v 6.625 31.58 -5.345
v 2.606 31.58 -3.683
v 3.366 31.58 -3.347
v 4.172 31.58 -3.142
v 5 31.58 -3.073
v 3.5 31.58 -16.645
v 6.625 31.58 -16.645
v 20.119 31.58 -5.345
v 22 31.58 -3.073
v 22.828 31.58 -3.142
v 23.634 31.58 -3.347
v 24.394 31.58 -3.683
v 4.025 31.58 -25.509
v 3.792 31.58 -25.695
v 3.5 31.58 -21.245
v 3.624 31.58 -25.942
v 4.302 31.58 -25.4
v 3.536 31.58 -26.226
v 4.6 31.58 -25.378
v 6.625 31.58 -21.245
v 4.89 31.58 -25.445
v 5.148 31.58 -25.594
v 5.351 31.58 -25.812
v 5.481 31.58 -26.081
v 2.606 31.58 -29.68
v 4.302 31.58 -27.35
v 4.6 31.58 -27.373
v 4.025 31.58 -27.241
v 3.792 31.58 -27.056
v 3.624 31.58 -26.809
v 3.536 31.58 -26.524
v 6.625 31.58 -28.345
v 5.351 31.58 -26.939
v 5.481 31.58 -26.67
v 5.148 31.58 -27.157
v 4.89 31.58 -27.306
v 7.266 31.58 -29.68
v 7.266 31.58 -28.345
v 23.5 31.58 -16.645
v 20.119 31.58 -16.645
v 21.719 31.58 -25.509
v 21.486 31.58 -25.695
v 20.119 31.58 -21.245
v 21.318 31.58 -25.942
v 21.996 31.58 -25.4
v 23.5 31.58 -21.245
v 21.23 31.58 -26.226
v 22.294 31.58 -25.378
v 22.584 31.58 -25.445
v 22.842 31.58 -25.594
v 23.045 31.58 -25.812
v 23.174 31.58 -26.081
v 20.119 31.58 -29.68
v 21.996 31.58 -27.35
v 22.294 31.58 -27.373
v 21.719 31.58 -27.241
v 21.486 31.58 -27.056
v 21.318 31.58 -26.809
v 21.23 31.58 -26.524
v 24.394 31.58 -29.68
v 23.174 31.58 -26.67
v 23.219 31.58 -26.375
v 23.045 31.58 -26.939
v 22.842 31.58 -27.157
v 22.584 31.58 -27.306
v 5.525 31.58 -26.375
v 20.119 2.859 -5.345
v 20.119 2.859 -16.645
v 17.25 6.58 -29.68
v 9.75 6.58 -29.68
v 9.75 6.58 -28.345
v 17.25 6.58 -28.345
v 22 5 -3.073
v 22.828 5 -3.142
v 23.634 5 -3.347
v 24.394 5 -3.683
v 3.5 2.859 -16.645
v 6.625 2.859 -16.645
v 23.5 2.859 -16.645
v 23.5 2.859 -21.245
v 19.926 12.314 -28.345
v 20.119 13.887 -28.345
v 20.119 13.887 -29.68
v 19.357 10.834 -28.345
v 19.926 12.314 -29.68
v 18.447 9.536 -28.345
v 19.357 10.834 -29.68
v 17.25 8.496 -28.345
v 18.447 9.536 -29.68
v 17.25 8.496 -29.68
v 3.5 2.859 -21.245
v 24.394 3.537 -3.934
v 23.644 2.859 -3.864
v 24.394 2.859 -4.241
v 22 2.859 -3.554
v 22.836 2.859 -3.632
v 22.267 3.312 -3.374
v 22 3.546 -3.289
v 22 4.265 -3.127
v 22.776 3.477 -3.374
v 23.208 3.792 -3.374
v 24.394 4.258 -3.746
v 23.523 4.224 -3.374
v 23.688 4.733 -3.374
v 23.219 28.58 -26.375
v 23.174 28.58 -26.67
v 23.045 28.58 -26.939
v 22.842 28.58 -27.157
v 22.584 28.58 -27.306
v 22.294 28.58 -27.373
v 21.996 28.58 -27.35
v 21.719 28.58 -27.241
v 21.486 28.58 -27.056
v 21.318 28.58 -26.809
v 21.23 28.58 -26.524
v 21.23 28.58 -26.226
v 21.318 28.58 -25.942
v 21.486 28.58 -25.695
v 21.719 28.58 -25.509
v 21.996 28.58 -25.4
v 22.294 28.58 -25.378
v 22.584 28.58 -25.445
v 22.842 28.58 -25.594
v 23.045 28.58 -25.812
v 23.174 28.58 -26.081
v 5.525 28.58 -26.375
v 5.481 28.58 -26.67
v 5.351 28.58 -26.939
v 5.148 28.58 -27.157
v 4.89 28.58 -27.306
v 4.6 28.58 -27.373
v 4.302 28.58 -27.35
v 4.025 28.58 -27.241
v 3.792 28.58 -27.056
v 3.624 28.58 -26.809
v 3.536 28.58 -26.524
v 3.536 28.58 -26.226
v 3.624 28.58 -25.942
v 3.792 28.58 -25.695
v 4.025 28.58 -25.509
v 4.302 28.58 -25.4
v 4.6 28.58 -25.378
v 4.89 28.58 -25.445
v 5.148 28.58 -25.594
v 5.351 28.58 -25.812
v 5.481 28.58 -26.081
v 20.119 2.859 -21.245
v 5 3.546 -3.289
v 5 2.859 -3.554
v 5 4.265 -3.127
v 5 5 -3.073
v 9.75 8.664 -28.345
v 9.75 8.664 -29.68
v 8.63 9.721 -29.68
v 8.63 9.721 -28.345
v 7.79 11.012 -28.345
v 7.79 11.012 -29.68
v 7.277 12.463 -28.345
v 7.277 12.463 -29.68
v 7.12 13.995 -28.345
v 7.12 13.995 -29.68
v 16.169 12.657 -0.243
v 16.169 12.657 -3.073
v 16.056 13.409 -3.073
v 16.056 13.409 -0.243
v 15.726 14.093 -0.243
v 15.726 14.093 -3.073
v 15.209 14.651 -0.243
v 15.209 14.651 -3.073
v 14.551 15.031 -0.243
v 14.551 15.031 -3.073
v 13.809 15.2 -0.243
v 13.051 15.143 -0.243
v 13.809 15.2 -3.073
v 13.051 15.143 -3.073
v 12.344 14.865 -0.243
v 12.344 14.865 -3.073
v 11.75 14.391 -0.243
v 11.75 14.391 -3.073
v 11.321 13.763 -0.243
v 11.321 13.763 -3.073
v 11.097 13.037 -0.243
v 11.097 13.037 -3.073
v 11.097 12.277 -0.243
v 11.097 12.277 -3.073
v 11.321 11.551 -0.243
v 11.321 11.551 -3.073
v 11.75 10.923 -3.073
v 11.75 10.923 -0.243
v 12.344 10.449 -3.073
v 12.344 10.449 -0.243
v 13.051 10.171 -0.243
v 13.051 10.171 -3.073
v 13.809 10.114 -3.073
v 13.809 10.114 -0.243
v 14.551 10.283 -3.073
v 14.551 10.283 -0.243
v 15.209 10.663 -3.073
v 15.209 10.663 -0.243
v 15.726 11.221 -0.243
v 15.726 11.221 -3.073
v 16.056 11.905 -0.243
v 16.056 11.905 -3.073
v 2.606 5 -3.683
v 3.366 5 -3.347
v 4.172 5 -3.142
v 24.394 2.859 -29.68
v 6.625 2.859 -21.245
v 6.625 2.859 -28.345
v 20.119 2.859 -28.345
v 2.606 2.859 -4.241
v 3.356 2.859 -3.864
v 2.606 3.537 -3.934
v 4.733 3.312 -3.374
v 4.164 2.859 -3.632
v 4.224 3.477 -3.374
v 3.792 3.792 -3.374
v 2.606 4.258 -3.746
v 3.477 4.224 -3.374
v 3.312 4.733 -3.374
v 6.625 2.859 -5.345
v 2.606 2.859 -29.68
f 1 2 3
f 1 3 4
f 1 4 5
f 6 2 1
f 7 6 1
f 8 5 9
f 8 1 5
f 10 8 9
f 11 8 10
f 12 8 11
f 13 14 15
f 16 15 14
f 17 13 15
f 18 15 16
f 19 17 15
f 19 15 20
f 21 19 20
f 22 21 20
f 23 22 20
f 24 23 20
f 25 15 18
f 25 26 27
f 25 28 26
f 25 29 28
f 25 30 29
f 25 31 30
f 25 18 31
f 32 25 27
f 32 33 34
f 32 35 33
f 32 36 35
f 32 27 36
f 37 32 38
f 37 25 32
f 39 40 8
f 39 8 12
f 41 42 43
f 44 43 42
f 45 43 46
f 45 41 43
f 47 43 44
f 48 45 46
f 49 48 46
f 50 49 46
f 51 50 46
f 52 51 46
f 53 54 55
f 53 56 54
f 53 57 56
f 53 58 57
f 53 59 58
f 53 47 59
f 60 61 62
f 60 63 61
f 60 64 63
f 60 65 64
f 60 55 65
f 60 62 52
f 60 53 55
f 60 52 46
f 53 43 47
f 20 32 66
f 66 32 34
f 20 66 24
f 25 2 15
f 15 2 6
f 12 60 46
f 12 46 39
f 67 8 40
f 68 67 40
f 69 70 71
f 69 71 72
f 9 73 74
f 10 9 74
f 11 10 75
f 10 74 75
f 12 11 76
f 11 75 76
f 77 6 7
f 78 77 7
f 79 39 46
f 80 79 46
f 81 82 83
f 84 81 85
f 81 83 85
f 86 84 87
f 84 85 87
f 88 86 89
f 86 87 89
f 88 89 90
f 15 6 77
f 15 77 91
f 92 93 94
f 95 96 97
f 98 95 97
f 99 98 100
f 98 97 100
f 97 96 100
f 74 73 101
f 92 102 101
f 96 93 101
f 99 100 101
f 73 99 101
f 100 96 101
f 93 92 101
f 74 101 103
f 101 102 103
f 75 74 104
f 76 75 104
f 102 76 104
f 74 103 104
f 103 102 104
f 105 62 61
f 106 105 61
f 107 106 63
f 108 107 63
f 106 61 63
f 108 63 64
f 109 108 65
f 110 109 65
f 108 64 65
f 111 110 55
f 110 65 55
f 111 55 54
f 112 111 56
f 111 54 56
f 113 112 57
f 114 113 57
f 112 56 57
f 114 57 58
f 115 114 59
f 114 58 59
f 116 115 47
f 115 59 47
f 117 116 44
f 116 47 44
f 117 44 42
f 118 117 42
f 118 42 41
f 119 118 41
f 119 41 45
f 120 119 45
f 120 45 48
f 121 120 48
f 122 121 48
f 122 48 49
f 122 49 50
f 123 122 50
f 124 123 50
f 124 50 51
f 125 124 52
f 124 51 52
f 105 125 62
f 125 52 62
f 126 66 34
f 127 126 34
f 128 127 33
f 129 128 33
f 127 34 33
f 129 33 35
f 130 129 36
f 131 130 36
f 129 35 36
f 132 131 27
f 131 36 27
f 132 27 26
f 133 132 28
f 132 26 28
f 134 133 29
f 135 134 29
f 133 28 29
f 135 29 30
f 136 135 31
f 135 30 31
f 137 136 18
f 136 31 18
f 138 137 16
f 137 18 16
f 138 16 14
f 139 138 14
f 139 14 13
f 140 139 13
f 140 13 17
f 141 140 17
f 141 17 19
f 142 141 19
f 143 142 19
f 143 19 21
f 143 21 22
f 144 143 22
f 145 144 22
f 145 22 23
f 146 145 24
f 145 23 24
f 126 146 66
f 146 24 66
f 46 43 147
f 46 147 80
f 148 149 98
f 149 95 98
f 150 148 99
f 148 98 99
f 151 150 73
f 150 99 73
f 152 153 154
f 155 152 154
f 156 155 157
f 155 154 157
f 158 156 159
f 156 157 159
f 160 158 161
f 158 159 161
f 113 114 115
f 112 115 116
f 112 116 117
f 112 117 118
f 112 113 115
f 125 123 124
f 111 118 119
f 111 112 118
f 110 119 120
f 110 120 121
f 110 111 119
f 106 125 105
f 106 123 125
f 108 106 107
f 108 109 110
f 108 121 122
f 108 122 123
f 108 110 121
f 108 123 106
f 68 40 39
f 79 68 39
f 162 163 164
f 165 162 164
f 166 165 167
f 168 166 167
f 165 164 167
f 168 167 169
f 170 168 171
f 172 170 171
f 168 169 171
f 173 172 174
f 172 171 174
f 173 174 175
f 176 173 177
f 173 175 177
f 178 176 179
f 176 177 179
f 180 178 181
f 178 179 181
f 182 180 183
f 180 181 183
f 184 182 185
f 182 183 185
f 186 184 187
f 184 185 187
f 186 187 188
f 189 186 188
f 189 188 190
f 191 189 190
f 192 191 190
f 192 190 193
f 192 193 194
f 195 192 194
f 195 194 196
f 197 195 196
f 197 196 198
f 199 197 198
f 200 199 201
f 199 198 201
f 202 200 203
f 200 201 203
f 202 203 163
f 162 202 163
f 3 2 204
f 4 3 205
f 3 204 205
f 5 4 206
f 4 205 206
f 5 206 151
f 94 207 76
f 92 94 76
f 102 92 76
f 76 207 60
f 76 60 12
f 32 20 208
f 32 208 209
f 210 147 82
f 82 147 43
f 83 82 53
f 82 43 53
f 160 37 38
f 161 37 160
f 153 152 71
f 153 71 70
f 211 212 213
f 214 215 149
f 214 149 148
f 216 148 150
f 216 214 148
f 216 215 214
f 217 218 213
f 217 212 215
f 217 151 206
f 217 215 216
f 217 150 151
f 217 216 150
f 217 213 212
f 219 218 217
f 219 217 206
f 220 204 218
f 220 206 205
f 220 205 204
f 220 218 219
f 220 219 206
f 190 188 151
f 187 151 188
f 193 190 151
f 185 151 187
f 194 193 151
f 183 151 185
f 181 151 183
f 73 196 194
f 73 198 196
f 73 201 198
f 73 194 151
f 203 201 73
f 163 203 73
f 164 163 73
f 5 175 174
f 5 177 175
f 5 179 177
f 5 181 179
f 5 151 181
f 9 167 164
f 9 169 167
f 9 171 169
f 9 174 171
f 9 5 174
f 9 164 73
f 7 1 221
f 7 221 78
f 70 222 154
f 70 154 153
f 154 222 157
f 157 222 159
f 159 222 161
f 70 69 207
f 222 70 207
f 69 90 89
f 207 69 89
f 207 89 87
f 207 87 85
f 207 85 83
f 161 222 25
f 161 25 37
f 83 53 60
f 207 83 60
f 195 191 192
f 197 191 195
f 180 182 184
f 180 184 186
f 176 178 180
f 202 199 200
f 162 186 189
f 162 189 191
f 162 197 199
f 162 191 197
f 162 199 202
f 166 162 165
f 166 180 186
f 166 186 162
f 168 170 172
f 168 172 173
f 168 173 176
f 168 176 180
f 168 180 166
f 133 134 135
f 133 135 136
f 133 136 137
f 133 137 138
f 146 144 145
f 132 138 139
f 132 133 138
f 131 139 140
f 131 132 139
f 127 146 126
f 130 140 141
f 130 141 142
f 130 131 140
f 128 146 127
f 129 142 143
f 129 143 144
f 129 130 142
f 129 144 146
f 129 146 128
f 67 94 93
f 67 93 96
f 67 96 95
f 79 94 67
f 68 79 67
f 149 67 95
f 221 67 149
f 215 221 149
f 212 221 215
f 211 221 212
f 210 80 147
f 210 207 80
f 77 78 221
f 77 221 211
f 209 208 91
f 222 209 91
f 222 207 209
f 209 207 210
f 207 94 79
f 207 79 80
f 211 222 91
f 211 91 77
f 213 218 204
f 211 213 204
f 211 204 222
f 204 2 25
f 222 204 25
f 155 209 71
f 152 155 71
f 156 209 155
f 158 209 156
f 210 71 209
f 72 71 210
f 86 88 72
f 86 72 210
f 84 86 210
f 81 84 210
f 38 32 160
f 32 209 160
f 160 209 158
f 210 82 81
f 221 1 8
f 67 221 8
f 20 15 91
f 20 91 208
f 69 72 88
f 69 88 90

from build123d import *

# Parameters (mm, degrees)
SKETCH1_W           = 27
SKETCH1_H           = 32
BOSS_EXTRUDE1_DEPTH = 31.58
SKETCH3_W           = 20
SKETCH3_H           = 23
CUT_EXTRUDE1_DEPTH  = 30
SKETCH4_W           = 7.5
SKETCH4_H           = 3.655478676
CUT_EXTRUDE2_DEPTH  = 25
SKETCH5_R           = 6.5
SKETCH5_R_2         = 1.269841787
CUT_EXTRUDE4_DEPTH  = 10
SKETCH6_W           = 27
SKETCH6_H           = 3.072558681
CUT_EXTRUDE5_DEPTH  = 32.58
FILLET2_R           = 5
SKETCH7_R           = 2.55
BOSS_EXTRUDE2_DEPTH = 2.83
SKETCH8_W           = 3.381092642
SKETCH8_H           = 7.1
SKETCH8_H_2         = 11.3
SKETCH8_W_2         = 3.125
BOSS_EXTRUDE4_DEPTH = 30
SKETCH11_W          = 2.605806733
SKETCH11_H          = 28.316955939
CUT_EXTRUDE10_DEPTH = 32.58
SKETCH12_W          = 21.788386534
SKETCH12_H          = 2.319503847
CUT_EXTRUDE11_DEPTH = 32.58
SKETCH13_W          = 21.788386534
SKETCH13_H          = 2.858824784
CUT_EXTRUDE12_DEPTH = 30.437937473
CUT_EXTRUDE13_DEPTH = 10
SKETCH15_R          = 1
CUT_EXTRUDE14_DEPTH = 3


with BuildPart() as part:
    # Sketch1 → Boss-Extrude1 (new body)
    with BuildSketch(Plane(origin=(0, 0, 0), x_dir=(1, 0, 0), z_dir=(0, 1, 0))):
        with Locations((13.5, 16)):
            Rectangle(SKETCH1_W, SKETCH1_H)
    extrude(amount=BOSS_EXTRUDE1_DEPTH)

    # Sketch3 → Cut-Extrude1 (cut)
    with BuildSketch(Plane(origin=(0, 31.58, 0), x_dir=(1, 0, 0), z_dir=(0, 1, 0))):
        with Locations((13.5, 16.844521324)):
            Rectangle(SKETCH3_W, SKETCH3_H)
    extrude(amount=-CUT_EXTRUDE1_DEPTH, mode=Mode.SUBTRACT)

    # Sketch4 → Cut-Extrude2 (cut)
    with BuildSketch(Plane(origin=(0, 31.58, 0), x_dir=(1, 0, 0), z_dir=(0, 1, 0))):
        with Locations((13.5, 30.172260662)):
            Rectangle(SKETCH4_W, SKETCH4_H)
    extrude(amount=-CUT_EXTRUDE2_DEPTH, mode=Mode.SUBTRACT)

    # Sketch5 → Cut-Extrude4 (cut)
    with BuildSketch(Plane(origin=(0, 0, -32), x_dir=(-1, 0, 0), z_dir=(0, 0, -1))):
        with Locations((-13.618907358, 13.887482267)):
            Circle(SKETCH5_R)
        with Locations((-13.618907358, 13.887482267)):
            Circle(SKETCH5_R_2, mode=Mode.SUBTRACT)
    extrude(amount=-CUT_EXTRUDE4_DEPTH, mode=Mode.SUBTRACT)

    # Sketch6 → Cut-Extrude5 (cut, through all)
    with BuildSketch(Plane(origin=(0, 31.58, 0), x_dir=(1, 0, 0), z_dir=(0, 1, 0))):
        with Locations((13.5, 1.536279341)):
            Rectangle(SKETCH6_W, SKETCH6_H)
    extrude(amount=-CUT_EXTRUDE5_DEPTH, mode=Mode.SUBTRACT)

    # Fillet2
    fillet2_edges = [part.edges().sort_by_distance(p)[0] for p in [
        (13.5, 0, -32),
        (0, 0, -17.53627934),
        (27, 0, -17.53627934),
        (13.5, 0, -3.072558681),
        (0, 15.79, -3.072558681),
        (27, 15.79, -3.072558681),
        (0, 15.79, -32),
        (27, 15.79, -32),
    ]]
    fillet(fillet2_edges, radius=FILLET2_R)

    # Sketch7 → Boss-Extrude2 (add)
    with BuildSketch(Plane.XY.offset(-3.072558681)):
        with Locations((13.618907358, 12.657)):
            Circle(SKETCH7_R)
    extrude(amount=BOSS_EXTRUDE2_DEPTH)

    # Sketch8 → Boss-Extrude4 (add)
    with BuildSketch(Plane(origin=(0, 31.58, 0), x_dir=(1, 0, 0), z_dir=(0, 1, 0))):
        with Locations((21.809453679, 24.794521324)):
            Rectangle(SKETCH8_W, SKETCH8_H)
        with Locations((21.809453679, 10.994521324)):
            Rectangle(SKETCH8_W, SKETCH8_H_2)
        with Locations((5.0625, 24.794521324)):
            Rectangle(SKETCH8_W_2, SKETCH8_H)
        with Locations((5.0625, 10.994521324)):
            Rectangle(SKETCH8_W_2, SKETCH8_H_2)
    extrude(amount=-BOSS_EXTRUDE4_DEPTH)

    # Sketch11 → Cut-Extrude10 (cut, through all)
    with BuildSketch(Plane(origin=(0, 31.58, 0), x_dir=(1, 0, 0), z_dir=(0, 1, 0))):
        with Locations((1.302903367, 17.841522031)):
            Rectangle(SKETCH11_W, SKETCH11_H)
        Polygon((24.394193267, 18.51018278), (24.394193267, 32), (27, 32), (27, 2.645827608), (24.394193267, 2.645827608), (24.394193267, 18.158757191), align=None)
    extrude(amount=-CUT_EXTRUDE10_DEPTH, mode=Mode.SUBTRACT)

    # Sketch12 → Cut-Extrude11 (cut, through all)
    with BuildSketch(Plane(origin=(0, 31.58, 0), x_dir=(1, 0, 0), z_dir=(0, 1, 0))):
        with Locations((13.5, 30.840248077)):
            Rectangle(SKETCH12_W, SKETCH12_H)
    extrude(amount=-CUT_EXTRUDE11_DEPTH, mode=Mode.SUBTRACT)

    # Sketch13 → Cut-Extrude12 (cut, through all)
    with BuildSketch(Plane(origin=(0, 0, -29.680496153), x_dir=(-1, 0, 0), z_dir=(0, 0, -1))):
        with Locations((-13.5, 1.429412392)):
            Rectangle(SKETCH13_W, SKETCH13_H)
    extrude(amount=-CUT_EXTRUDE12_DEPTH, mode=Mode.SUBTRACT)

    # Sketch14 → Cut-Extrude13 (cut)
    with BuildSketch(Plane(origin=(0, 0, -29.680496153), x_dir=(-1, 0, 0), z_dir=(0, 0, -1))):
        Polygon((-20.118907358, 13.887482267), (-20.118907358, 31.58), (-7.265621144, 31.58), (-7.118907358, 13.887482267), align=None)
    extrude(amount=-CUT_EXTRUDE13_DEPTH, mode=Mode.SUBTRACT)

    # Sketch15 → Cut-Extrude14 (cut)
    with BuildSketch(Plane(origin=(0, 31.58, 0), x_dir=(1, 0, 0), z_dir=(0, 1, 0))):
        with Locations((4.525, 26.375422159)):
            Circle(SKETCH15_R)
        with Locations((22.218907358, 26.375422159)):
            Circle(SKETCH15_R)
    extrude(amount=-CUT_EXTRUDE14_DEPTH, mode=Mode.SUBTRACT)


solid = part.part
